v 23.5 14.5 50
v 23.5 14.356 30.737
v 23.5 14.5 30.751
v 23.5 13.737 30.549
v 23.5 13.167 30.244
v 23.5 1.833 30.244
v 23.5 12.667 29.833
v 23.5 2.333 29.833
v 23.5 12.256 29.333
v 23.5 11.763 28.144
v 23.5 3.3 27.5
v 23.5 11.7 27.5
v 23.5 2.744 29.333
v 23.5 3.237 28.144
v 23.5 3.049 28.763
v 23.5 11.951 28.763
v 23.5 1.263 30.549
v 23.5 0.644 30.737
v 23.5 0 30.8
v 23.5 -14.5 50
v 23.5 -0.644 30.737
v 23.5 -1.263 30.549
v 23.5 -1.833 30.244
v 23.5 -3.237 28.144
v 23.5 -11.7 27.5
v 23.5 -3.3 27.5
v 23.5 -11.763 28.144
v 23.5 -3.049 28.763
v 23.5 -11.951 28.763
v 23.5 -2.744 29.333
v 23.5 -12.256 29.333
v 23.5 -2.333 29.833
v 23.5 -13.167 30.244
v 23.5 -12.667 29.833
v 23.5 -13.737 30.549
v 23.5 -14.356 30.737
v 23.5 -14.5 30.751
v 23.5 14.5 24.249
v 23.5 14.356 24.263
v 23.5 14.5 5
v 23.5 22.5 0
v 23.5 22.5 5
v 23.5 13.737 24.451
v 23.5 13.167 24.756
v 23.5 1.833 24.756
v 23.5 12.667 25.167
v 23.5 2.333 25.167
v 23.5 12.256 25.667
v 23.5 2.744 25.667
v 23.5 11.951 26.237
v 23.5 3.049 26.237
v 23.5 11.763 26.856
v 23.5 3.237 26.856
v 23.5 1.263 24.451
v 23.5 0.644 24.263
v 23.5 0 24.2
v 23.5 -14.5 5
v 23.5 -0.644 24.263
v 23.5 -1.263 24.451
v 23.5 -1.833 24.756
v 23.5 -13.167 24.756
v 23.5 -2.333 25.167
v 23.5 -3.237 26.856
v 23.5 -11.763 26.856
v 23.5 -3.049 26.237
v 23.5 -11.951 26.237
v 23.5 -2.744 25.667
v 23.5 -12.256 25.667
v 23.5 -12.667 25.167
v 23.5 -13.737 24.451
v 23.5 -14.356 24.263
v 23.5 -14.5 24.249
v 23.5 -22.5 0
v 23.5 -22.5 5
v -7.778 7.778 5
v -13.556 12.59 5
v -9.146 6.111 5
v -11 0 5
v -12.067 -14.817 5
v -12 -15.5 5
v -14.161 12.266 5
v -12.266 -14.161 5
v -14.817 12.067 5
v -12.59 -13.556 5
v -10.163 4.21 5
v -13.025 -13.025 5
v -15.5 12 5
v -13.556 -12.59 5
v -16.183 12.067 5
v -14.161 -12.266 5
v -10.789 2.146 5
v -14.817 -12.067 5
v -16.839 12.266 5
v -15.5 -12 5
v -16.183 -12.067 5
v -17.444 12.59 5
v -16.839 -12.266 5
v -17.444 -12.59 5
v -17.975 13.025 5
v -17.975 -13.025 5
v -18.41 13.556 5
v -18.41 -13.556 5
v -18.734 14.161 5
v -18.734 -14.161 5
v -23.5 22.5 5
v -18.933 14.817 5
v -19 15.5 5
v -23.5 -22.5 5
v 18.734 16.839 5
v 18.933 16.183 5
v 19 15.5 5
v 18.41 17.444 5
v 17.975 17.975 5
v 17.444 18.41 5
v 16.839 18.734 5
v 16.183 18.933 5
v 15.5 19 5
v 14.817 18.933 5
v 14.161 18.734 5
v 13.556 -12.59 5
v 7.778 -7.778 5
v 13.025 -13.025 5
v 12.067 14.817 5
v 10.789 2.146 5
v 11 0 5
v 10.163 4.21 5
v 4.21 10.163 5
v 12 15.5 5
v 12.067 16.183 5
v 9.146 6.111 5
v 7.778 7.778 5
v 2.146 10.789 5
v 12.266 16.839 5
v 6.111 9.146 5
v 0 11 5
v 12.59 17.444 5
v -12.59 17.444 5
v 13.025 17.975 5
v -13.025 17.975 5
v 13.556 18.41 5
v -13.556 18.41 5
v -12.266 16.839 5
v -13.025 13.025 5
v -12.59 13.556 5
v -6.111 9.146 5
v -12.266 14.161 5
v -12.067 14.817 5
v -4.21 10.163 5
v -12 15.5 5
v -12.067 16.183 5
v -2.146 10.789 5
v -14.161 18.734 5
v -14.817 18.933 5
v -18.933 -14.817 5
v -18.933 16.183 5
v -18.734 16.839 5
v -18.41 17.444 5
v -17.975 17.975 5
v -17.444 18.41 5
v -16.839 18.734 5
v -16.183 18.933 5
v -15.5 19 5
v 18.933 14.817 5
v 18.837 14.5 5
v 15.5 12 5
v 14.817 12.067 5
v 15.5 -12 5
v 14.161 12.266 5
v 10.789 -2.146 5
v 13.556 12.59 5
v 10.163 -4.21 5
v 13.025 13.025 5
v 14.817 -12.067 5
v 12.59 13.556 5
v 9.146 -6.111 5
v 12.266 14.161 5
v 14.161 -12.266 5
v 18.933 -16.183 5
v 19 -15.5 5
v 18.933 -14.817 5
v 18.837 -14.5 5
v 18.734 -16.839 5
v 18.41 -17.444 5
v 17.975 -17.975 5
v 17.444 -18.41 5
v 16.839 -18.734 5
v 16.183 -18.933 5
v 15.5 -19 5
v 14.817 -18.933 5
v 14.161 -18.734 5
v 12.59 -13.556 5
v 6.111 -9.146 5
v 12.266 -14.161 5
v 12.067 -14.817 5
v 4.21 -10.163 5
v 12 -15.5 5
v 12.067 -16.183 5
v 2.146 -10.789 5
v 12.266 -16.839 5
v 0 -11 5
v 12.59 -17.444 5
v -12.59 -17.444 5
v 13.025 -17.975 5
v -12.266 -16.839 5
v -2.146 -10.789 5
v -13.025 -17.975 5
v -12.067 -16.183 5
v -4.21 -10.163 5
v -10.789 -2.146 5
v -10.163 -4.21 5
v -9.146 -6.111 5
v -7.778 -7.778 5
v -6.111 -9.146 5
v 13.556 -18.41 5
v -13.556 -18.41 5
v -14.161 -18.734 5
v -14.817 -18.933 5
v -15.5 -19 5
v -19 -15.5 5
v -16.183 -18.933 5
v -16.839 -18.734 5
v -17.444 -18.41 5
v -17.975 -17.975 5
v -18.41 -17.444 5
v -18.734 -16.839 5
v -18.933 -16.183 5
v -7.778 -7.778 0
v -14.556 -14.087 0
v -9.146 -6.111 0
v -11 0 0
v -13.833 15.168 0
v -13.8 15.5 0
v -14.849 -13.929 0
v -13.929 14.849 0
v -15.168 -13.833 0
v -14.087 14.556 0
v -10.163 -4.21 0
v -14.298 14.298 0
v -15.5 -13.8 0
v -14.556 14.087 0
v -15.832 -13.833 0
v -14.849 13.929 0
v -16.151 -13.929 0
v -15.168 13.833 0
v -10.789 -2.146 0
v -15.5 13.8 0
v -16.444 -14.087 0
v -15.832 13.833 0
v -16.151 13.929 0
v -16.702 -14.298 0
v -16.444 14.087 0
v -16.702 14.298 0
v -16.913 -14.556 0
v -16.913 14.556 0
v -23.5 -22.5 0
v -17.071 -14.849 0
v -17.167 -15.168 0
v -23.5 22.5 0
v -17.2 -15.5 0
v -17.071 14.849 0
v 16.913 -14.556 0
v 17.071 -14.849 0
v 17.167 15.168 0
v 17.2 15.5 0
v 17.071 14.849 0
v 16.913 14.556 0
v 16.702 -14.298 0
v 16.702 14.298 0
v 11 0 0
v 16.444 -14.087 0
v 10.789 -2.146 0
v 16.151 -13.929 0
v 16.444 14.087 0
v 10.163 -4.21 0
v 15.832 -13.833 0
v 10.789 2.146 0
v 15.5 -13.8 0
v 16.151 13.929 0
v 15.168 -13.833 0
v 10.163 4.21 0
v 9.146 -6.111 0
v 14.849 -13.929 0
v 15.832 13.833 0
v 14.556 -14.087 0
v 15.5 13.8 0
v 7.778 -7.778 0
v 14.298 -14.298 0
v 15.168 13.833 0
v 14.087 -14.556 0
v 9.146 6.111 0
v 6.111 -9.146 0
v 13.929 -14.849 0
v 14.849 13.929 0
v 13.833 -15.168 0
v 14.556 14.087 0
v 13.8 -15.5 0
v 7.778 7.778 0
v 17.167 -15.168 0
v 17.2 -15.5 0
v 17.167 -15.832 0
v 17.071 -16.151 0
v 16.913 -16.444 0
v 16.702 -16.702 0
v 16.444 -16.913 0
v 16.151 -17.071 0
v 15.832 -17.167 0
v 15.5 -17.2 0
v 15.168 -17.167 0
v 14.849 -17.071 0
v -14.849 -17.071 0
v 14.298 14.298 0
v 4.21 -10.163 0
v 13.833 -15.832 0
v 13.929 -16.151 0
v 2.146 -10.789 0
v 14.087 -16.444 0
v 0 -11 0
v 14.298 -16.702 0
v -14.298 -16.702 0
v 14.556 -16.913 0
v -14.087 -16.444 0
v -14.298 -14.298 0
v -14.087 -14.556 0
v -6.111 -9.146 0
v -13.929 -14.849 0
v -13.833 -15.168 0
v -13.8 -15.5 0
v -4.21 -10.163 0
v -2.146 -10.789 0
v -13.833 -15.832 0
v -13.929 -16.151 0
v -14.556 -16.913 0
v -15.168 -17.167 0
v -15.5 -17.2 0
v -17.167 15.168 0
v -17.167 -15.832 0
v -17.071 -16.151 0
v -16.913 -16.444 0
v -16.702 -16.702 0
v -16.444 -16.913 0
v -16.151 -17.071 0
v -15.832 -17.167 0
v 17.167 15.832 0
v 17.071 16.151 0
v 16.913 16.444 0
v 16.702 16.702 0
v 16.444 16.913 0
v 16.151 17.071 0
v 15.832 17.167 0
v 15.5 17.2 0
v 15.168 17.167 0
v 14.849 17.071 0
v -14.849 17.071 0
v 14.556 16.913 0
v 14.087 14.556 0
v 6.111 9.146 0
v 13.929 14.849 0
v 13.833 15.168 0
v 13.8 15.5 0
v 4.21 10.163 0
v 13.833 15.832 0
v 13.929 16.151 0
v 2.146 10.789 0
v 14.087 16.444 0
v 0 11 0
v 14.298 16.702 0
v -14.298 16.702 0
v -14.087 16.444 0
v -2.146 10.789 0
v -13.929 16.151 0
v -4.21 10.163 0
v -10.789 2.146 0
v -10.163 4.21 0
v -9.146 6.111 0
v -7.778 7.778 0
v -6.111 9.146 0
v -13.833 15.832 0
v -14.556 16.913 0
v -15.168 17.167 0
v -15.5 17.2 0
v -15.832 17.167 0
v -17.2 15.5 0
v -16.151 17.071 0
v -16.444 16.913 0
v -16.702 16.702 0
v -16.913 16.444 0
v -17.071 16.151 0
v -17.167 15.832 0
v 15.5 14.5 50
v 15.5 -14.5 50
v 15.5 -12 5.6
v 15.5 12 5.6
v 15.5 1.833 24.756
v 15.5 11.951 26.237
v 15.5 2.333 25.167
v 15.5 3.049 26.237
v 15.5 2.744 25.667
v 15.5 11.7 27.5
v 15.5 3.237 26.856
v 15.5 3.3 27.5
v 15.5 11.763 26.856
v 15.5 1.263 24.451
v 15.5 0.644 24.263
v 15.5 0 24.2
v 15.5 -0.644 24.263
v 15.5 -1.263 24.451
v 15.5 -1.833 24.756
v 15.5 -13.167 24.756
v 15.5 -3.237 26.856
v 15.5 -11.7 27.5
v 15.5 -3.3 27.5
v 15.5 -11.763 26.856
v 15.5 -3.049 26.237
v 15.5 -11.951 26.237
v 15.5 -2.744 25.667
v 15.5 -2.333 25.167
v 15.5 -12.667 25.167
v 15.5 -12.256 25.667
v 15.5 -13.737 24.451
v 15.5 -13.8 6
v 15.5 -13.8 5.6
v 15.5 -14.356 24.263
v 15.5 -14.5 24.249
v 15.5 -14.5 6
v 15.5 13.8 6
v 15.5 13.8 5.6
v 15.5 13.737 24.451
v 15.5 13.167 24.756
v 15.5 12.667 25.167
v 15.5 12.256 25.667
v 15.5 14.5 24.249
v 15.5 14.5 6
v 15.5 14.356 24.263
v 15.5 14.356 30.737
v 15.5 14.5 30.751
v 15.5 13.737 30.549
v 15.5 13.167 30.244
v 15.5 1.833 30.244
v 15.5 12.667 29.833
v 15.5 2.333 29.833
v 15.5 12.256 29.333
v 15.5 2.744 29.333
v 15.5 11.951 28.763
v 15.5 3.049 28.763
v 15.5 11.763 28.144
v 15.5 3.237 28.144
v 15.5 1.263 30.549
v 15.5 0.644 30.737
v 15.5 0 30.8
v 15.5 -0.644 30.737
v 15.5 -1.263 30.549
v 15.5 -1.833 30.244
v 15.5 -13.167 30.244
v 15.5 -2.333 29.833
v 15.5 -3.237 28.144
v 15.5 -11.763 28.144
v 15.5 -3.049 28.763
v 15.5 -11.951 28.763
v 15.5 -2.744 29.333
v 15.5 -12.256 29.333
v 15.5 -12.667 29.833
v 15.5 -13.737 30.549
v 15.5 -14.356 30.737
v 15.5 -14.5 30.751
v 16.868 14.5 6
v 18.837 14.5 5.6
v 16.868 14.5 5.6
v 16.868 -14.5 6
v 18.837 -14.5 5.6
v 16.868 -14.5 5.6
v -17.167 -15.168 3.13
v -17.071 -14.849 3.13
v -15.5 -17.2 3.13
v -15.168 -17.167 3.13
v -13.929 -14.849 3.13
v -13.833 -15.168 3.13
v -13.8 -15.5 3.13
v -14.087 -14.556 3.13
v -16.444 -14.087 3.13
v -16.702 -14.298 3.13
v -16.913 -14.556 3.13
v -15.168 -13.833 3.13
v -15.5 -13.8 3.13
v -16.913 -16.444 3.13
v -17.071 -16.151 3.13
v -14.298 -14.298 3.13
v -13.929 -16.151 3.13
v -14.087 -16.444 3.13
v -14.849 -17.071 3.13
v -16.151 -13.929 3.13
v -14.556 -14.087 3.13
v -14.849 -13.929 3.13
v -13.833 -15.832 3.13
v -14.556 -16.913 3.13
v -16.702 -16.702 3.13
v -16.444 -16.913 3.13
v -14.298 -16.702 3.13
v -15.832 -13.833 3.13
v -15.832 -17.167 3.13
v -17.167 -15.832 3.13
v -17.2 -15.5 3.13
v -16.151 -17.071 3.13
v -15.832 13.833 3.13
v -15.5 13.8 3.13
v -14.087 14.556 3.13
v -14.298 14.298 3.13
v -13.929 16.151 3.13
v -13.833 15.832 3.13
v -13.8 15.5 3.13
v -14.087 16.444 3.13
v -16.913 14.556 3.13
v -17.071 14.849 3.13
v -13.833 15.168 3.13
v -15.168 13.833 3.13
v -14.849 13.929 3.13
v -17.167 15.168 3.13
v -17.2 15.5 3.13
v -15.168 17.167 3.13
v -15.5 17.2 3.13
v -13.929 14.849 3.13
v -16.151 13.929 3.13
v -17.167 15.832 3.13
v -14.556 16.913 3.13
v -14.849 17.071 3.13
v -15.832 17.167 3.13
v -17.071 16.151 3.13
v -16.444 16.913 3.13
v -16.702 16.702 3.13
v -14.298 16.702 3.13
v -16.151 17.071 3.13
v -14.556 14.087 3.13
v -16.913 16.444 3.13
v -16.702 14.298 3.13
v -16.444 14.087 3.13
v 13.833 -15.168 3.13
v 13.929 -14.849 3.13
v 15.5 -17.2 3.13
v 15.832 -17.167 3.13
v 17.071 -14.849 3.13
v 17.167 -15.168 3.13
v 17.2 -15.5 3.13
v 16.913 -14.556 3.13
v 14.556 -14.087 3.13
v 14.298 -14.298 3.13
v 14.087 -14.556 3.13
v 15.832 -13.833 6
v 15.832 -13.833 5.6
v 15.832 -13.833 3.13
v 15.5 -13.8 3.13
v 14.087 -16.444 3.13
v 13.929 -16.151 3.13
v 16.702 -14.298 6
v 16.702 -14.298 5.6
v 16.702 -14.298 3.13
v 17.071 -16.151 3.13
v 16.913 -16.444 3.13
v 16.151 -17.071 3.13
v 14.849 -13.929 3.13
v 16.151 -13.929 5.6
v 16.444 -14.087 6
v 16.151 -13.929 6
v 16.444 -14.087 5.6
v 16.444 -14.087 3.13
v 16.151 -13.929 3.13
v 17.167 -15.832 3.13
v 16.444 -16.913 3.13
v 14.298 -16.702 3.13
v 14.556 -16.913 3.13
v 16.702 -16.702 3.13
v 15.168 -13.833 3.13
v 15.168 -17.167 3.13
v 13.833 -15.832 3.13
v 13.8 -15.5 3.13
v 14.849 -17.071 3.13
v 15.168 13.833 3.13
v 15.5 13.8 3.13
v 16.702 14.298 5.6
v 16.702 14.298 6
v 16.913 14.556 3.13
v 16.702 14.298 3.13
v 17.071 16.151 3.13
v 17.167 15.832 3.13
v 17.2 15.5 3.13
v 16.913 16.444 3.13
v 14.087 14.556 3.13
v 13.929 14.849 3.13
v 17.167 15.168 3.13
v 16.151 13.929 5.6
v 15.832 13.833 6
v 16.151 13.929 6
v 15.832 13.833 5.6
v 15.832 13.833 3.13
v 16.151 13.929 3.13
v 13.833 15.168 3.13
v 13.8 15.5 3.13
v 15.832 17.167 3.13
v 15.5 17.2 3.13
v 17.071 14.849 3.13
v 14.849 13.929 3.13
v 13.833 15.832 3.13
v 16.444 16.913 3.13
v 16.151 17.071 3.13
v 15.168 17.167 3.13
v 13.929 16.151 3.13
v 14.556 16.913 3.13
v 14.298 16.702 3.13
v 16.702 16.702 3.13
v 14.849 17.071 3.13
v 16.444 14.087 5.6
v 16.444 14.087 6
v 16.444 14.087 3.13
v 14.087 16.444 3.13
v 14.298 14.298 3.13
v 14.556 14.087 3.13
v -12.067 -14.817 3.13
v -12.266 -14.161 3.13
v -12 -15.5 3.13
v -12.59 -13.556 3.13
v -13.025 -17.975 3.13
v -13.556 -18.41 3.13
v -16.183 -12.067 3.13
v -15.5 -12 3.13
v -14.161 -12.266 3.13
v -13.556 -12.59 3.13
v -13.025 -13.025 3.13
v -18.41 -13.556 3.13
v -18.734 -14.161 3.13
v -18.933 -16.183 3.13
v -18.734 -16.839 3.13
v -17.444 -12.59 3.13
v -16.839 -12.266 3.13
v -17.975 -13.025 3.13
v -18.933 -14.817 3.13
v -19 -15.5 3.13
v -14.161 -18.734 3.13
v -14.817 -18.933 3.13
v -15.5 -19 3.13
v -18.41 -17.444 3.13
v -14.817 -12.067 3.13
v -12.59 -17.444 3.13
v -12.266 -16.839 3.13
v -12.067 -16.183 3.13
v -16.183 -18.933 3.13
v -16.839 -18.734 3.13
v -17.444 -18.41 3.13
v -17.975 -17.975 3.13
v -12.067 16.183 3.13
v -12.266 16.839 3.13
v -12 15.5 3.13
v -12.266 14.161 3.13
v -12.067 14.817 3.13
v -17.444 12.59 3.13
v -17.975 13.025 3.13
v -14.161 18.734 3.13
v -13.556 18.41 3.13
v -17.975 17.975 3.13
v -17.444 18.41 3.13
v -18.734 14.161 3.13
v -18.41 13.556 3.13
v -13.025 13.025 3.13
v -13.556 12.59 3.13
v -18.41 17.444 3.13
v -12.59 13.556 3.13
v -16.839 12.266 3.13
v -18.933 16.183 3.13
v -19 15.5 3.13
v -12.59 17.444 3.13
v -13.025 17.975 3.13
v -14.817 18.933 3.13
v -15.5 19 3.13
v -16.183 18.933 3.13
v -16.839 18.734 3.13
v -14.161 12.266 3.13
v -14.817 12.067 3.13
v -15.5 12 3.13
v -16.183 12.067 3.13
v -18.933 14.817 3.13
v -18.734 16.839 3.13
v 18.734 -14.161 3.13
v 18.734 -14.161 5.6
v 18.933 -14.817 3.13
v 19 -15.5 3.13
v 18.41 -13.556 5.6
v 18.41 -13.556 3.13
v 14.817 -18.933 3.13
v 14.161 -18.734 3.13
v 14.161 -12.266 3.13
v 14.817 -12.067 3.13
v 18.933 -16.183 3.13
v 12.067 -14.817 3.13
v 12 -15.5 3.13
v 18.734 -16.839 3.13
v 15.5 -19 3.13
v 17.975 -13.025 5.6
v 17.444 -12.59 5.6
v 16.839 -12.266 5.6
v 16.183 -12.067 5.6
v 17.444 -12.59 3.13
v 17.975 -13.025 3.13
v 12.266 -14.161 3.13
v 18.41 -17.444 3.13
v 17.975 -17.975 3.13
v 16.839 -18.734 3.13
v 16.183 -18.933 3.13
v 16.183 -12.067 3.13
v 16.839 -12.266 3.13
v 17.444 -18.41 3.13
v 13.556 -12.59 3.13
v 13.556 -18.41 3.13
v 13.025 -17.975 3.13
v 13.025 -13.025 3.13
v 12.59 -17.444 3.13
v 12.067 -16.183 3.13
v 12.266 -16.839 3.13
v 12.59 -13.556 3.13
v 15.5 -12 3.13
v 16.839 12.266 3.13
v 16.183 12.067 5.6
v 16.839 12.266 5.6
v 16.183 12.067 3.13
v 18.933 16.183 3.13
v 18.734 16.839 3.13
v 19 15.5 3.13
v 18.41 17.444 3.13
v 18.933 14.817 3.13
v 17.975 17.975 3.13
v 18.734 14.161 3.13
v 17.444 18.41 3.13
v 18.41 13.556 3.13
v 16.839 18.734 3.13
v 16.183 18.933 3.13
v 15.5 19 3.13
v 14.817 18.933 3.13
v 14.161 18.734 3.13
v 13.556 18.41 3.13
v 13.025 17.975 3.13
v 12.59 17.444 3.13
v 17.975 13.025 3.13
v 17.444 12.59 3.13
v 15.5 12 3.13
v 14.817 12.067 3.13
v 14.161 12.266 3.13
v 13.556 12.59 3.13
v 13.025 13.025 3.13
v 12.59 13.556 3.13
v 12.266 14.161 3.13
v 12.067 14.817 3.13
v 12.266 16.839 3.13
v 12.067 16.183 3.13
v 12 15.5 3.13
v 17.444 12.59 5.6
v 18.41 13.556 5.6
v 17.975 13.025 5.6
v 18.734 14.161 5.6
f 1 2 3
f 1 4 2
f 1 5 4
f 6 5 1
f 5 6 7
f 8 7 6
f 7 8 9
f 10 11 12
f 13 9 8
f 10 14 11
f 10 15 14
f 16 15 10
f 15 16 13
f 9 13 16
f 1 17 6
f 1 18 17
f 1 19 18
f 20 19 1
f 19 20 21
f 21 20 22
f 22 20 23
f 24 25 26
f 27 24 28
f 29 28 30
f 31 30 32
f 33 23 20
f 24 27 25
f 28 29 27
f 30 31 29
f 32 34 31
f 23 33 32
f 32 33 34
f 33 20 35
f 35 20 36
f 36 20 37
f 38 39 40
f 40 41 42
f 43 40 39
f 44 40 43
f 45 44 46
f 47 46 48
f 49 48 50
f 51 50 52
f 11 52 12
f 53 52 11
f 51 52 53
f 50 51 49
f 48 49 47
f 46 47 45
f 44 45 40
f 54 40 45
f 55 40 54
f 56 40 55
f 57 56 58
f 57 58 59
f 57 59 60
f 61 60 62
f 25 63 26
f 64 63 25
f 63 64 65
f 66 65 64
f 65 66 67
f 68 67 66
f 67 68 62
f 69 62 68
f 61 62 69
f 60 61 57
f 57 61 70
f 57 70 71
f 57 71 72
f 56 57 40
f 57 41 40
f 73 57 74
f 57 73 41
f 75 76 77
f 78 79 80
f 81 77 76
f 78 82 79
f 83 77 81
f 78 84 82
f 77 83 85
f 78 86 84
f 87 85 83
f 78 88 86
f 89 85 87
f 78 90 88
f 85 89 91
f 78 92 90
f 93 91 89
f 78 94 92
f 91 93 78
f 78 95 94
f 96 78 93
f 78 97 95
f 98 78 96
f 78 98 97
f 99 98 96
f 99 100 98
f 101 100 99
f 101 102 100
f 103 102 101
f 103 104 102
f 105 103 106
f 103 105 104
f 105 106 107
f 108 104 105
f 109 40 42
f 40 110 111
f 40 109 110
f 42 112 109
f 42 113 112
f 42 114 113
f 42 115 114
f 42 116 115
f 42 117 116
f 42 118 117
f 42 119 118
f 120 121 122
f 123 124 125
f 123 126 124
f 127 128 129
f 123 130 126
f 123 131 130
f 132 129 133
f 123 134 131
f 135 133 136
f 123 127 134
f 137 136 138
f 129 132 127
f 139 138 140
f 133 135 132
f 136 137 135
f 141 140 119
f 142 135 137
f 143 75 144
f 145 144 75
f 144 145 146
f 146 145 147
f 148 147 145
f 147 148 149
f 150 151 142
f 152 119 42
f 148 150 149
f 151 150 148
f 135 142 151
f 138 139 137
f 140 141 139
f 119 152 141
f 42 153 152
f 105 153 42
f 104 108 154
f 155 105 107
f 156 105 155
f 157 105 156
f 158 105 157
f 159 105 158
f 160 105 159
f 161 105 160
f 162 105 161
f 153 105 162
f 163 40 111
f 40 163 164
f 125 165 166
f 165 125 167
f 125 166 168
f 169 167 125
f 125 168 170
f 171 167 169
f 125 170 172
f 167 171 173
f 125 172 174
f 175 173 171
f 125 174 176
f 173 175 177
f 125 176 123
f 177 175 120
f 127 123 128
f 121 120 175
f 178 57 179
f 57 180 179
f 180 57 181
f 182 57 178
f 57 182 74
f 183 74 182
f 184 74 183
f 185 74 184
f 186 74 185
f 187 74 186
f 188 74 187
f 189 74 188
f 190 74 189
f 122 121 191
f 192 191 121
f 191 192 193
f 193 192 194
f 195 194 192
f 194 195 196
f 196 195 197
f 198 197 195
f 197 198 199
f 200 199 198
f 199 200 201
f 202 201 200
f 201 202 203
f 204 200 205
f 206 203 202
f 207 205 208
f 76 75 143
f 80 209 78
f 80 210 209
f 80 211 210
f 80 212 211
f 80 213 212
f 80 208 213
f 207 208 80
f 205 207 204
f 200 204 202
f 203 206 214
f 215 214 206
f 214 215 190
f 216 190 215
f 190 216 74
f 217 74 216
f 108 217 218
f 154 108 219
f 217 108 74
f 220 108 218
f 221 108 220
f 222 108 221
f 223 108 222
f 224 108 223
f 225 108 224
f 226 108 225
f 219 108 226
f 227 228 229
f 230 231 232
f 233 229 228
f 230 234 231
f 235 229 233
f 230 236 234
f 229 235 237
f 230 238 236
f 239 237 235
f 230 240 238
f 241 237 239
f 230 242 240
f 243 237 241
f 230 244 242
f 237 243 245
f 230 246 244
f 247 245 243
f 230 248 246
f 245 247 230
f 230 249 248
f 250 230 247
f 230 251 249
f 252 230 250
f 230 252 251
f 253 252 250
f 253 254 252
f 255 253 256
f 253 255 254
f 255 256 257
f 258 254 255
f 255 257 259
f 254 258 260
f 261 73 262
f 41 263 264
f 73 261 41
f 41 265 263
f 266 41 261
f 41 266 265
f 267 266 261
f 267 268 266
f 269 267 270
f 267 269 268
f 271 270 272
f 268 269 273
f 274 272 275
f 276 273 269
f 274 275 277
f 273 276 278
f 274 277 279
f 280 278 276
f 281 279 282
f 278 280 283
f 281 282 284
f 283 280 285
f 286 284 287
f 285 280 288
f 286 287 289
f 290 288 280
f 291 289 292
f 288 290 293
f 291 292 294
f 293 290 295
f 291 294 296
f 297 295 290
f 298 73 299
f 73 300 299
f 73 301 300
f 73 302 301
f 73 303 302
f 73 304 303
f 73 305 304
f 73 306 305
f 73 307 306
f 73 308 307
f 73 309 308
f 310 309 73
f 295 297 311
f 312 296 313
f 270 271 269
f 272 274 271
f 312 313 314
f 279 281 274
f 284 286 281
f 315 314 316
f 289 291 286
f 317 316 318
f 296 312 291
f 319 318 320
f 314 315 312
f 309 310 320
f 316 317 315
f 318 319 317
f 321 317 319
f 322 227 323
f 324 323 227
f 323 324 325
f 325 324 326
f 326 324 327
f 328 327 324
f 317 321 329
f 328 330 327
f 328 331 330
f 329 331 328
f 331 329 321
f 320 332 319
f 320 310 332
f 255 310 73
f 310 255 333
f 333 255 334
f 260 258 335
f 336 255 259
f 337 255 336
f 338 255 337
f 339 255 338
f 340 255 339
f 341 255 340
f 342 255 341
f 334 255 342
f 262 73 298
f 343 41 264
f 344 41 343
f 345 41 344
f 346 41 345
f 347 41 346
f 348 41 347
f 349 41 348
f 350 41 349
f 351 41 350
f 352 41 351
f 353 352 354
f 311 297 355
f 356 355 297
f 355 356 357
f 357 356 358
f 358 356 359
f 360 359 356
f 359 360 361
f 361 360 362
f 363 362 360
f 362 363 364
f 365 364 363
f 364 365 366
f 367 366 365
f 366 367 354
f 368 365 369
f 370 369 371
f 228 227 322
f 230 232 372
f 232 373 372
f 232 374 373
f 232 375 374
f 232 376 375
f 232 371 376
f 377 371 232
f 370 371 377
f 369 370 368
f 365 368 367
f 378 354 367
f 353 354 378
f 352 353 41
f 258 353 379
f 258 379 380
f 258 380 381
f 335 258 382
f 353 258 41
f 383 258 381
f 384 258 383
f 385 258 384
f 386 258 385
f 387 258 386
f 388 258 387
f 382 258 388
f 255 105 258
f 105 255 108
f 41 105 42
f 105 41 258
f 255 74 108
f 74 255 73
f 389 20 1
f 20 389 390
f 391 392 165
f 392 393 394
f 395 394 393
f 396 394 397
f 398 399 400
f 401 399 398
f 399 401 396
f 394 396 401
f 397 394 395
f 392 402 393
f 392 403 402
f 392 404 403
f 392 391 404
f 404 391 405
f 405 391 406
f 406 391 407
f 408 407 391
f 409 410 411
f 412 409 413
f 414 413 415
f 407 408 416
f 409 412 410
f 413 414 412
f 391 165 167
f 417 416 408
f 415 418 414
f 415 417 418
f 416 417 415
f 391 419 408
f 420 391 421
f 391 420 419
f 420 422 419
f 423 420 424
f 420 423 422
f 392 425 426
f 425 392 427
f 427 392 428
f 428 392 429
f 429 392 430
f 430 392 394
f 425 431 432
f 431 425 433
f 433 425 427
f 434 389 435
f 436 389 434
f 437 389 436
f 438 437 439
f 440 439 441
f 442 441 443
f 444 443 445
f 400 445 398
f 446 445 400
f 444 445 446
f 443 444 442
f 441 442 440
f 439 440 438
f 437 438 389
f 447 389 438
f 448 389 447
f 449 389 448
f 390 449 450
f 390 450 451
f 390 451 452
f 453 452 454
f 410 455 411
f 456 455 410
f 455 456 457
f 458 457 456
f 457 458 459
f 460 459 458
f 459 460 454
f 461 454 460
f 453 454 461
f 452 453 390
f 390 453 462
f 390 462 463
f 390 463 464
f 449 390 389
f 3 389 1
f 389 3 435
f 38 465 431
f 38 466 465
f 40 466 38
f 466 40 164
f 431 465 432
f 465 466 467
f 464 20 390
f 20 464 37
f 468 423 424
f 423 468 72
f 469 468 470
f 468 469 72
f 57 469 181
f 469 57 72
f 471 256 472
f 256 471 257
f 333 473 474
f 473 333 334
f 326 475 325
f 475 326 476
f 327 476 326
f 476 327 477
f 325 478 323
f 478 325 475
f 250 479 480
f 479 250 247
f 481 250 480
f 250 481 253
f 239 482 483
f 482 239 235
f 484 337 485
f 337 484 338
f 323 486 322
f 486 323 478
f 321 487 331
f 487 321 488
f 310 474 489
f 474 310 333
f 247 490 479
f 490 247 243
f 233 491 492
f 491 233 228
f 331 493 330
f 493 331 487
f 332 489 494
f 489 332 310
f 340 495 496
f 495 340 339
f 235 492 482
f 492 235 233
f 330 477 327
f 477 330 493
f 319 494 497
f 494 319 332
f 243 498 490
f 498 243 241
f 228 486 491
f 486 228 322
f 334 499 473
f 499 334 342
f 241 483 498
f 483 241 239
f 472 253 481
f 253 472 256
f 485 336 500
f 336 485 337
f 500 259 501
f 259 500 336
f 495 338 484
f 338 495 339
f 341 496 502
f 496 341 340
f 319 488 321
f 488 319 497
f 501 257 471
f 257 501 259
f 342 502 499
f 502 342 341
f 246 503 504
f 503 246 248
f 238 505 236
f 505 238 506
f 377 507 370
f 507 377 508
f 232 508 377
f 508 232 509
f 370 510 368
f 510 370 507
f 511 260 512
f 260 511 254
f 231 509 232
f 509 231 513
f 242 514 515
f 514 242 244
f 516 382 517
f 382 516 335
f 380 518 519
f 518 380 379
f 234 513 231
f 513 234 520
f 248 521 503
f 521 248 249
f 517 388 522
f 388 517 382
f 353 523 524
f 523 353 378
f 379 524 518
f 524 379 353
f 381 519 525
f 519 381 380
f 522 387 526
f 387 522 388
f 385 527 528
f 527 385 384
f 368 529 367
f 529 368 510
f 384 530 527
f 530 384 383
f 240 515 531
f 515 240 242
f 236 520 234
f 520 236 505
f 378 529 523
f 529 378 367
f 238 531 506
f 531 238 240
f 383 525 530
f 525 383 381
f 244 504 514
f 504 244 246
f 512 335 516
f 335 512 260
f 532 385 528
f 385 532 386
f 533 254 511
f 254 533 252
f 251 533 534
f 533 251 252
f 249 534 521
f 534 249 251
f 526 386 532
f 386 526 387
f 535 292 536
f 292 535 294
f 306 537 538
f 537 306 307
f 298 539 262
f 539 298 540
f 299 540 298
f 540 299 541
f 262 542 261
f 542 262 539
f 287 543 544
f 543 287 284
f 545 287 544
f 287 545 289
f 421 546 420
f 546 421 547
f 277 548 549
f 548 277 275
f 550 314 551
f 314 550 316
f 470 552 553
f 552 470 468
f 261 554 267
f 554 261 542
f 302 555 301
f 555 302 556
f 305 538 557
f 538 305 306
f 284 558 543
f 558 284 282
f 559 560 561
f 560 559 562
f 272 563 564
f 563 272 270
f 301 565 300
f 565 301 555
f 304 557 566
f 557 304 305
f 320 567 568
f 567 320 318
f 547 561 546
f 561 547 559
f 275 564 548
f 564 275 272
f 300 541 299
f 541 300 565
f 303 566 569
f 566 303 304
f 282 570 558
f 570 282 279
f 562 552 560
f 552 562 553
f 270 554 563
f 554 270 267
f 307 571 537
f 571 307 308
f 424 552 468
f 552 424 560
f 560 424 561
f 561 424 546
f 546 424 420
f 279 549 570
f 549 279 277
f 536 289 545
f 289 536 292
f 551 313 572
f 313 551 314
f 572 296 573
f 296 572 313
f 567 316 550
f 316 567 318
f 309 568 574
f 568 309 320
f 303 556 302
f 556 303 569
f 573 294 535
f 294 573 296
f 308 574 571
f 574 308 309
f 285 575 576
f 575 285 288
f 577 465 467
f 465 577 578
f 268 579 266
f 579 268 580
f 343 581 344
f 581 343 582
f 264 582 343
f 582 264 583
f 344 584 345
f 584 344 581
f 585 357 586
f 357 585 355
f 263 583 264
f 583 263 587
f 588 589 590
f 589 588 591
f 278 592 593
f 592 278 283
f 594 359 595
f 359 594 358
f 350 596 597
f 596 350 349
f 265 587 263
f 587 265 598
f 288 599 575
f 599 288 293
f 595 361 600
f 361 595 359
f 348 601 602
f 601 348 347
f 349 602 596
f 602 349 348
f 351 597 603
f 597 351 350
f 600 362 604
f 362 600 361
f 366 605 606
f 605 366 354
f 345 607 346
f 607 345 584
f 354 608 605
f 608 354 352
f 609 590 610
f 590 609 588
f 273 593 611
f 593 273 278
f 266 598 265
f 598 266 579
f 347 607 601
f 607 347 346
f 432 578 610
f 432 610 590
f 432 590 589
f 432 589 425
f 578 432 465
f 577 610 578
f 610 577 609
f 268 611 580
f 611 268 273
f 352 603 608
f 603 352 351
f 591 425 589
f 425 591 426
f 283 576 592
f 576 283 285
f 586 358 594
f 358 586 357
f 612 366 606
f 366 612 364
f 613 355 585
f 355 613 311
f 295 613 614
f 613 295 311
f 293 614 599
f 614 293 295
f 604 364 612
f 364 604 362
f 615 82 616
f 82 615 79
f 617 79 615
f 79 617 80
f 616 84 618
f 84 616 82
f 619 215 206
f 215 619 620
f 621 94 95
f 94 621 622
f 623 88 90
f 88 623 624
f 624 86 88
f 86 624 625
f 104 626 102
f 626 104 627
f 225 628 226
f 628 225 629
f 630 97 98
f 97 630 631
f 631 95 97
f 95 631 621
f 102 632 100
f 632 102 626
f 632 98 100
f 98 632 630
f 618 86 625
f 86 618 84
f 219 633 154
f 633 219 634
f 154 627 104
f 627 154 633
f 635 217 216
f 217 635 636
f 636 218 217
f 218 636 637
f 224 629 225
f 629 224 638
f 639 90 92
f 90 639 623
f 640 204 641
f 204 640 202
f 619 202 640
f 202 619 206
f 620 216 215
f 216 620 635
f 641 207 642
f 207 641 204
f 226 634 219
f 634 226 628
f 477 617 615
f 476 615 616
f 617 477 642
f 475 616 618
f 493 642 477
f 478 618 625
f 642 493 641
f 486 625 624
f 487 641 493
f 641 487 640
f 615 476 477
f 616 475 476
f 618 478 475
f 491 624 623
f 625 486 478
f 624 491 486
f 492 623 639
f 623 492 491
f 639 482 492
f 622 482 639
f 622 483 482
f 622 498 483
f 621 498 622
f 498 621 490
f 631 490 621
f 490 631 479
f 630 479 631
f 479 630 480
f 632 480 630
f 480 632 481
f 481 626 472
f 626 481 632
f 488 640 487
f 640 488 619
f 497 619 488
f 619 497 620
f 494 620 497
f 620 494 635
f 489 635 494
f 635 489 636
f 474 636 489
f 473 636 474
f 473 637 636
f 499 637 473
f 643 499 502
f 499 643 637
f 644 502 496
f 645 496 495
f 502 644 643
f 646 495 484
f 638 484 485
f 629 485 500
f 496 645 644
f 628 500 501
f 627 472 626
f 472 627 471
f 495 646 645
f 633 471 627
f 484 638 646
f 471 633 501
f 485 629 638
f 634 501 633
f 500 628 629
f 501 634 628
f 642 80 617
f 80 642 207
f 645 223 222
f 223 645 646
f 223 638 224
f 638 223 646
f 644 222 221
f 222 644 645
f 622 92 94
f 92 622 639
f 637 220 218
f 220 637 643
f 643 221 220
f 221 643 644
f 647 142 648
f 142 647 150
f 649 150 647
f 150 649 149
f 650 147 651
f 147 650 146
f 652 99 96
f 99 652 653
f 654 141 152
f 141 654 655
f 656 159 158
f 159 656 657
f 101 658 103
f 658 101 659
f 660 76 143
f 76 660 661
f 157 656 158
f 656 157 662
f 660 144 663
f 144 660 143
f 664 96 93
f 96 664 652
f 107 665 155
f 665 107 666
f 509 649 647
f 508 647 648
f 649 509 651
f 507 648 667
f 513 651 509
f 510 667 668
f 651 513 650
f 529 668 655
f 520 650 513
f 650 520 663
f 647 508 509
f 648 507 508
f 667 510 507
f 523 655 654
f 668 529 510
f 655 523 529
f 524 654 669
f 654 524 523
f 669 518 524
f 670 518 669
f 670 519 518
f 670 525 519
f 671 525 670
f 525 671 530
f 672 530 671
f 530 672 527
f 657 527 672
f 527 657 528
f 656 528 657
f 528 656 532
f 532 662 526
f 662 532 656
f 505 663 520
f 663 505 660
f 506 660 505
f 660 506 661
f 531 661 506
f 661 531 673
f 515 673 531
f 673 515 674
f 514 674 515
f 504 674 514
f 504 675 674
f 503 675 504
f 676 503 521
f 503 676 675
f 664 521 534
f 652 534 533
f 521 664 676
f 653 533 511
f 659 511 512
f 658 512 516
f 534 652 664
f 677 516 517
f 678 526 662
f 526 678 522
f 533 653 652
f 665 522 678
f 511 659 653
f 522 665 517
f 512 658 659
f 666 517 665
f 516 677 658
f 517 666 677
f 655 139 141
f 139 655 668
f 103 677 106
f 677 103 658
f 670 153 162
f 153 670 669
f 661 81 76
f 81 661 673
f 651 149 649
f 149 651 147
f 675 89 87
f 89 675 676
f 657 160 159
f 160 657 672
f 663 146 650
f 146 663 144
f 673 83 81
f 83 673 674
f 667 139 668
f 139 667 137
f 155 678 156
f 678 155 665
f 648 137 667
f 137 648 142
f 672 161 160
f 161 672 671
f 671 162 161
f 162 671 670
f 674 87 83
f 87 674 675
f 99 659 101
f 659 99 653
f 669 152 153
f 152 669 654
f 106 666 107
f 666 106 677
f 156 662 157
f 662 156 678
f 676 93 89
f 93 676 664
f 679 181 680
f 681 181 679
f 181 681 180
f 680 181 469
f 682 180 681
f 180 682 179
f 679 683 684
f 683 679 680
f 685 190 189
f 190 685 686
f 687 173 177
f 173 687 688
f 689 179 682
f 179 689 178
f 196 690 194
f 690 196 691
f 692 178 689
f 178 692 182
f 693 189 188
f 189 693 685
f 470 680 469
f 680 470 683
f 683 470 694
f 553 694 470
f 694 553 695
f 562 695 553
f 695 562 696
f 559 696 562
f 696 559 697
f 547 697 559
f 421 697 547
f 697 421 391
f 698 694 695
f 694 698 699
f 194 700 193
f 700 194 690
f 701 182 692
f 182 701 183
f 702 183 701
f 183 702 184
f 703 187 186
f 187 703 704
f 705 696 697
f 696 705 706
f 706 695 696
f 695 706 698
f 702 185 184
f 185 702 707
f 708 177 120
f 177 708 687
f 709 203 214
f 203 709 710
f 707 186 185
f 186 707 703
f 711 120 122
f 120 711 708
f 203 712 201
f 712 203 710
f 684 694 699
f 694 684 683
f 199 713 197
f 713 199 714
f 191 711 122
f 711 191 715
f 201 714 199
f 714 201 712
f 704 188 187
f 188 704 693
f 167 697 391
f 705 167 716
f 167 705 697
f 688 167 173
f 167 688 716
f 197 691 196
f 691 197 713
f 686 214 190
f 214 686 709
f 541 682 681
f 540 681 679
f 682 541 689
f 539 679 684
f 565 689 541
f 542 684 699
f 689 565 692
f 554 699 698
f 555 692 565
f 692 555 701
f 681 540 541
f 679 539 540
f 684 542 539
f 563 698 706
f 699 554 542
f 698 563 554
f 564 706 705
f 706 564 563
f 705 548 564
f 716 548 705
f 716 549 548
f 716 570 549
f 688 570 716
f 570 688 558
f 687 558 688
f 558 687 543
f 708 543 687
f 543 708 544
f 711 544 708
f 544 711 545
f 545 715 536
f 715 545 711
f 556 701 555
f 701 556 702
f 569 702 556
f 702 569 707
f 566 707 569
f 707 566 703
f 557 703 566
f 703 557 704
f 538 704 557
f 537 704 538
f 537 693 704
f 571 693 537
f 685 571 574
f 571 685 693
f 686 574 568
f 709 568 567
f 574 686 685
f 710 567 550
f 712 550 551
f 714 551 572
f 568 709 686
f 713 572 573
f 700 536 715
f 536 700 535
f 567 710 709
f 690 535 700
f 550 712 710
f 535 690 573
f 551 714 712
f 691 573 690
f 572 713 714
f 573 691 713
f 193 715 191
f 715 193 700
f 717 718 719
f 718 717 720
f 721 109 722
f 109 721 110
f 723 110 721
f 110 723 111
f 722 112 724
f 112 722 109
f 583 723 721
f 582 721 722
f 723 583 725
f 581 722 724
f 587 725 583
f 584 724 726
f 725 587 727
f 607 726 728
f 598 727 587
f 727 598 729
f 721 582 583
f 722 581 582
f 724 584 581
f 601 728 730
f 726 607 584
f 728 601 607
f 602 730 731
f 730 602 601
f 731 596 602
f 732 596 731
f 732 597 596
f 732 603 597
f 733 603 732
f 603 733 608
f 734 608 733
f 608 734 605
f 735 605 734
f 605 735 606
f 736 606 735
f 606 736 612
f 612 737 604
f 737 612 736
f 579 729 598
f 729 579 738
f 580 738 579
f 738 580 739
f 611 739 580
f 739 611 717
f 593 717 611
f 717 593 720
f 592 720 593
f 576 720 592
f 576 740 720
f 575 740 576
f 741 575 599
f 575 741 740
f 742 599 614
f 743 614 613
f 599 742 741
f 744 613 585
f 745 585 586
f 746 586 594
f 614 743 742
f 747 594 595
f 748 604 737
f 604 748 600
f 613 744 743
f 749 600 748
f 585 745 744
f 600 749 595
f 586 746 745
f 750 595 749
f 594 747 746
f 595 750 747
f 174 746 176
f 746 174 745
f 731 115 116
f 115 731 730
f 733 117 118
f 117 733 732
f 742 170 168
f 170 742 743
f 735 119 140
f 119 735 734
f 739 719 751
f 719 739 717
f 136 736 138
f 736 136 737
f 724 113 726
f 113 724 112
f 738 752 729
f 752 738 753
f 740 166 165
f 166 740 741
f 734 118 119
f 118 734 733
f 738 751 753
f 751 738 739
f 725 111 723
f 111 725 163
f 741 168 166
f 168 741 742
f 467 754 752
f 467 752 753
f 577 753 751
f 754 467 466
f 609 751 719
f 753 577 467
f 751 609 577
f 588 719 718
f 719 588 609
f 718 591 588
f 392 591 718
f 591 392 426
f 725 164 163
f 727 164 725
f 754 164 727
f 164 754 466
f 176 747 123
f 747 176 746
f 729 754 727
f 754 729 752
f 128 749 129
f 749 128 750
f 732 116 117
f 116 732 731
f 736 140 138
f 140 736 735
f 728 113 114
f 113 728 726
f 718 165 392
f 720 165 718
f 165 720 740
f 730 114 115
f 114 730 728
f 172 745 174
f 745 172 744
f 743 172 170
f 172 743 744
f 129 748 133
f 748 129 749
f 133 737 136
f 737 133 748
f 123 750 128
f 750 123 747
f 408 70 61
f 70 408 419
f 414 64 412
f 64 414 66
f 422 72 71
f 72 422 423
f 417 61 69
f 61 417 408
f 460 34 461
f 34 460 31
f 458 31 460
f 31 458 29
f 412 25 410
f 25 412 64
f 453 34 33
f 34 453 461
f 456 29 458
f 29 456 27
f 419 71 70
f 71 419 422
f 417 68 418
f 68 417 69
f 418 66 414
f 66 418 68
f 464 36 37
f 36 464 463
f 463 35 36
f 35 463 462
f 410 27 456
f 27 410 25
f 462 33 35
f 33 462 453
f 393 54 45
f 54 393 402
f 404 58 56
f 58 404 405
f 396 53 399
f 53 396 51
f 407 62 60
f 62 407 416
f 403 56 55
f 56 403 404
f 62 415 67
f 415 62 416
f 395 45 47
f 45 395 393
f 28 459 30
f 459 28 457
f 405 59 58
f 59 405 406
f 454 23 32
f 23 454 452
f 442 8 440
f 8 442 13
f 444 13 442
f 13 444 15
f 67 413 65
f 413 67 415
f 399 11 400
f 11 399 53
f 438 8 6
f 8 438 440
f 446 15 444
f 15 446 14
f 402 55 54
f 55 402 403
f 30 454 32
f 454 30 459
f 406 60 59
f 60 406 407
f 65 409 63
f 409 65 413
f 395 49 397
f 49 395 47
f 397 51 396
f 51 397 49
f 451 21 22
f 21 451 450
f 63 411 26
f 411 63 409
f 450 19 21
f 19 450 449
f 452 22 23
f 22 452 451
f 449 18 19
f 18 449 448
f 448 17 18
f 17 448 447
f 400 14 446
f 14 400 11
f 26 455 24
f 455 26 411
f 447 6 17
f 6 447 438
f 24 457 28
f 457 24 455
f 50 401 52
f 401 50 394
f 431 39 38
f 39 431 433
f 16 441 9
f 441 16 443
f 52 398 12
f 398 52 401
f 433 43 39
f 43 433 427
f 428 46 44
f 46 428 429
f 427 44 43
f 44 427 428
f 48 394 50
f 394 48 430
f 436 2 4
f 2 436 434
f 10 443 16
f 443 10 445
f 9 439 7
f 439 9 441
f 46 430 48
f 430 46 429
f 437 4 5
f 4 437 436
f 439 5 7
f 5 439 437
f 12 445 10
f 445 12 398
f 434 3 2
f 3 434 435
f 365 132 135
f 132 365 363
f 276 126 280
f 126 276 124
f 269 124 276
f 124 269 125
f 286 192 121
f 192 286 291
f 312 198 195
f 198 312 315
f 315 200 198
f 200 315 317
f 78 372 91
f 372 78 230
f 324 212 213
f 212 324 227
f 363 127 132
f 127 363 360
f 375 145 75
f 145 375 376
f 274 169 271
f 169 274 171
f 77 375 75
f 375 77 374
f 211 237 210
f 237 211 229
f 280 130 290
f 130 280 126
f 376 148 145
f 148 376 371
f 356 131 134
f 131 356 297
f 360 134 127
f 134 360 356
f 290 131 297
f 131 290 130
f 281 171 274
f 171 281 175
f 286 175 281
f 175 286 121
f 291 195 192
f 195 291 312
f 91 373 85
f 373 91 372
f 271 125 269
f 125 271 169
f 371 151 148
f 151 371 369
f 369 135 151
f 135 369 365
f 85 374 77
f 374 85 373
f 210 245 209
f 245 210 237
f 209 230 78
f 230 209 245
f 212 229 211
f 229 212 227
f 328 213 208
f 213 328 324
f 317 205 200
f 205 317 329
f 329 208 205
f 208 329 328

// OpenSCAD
$fn = 32;

// ----------------------------------------------------------------------
// Motor mount plate: NEMA17, 47 x 45 x 55 mm
// ----------------------------------------------------------------------

// --- parameters (mm) ---
plate_w = 47;             // plate length, X
plate_d = 45;             // plate width, Y
plate_t = 5;              // plate thickness
pattern = 31;             // NEMA17 bolt spacing
motor_d = 3.4;            // NEMA17 screw clearance
pilot_d = 22;             // pilot boss bore
cb_d = 7;                 // counterbore seat
cb_h = 1.87;              // counterbore depth
second_d = 6.6;           // second fastener hole
wall_h = 50;              // upright height
wall_t = 8;               // upright thickness

module plate() {
  translate([-plate_w / 2, -plate_d / 2, 0]) cube([plate_w, plate_d, plate_t]);
}

module motor_holes() {
  for (sx = [-1, 1]) for (sy = [-1, 1])
    translate([sx * pattern / 2, sy * pattern / 2, -1])
      cylinder(h = plate_t + 2, d = motor_d);
}
module motor_counterbores() {
  for (sx = [-1, 1]) for (sy = [-1, 1])
    translate([sx * pattern / 2, sy * pattern / 2, plate_t - cb_h])
      cylinder(h = cb_h + 0.6, d = cb_d);
}
module upright() {
  /* wall sunk 1 mm into the plate for a positive overlap */
  translate([plate_w / 2 - wall_t, -plate_d / 2 + wall_t, plate_t - 1])
    cube([wall_t, plate_d - 2 * wall_t, wall_h - plate_t + 1]);
}

difference() {
  union() {
    plate();
    upright();
  }
  motor_holes();
  translate([0, 0, -1]) cylinder(h = plate_t + 2, d = pilot_d);
  motor_counterbores();
  for (i = [0 : 2])
    translate([plate_w / 2 - wall_t - 1, (i - 1) * wall_h * 0.3, plate_t + wall_h * 0.45]) rotate([0, 90, 0]) cylinder(h = wall_t + 2, d = second_d);
}
